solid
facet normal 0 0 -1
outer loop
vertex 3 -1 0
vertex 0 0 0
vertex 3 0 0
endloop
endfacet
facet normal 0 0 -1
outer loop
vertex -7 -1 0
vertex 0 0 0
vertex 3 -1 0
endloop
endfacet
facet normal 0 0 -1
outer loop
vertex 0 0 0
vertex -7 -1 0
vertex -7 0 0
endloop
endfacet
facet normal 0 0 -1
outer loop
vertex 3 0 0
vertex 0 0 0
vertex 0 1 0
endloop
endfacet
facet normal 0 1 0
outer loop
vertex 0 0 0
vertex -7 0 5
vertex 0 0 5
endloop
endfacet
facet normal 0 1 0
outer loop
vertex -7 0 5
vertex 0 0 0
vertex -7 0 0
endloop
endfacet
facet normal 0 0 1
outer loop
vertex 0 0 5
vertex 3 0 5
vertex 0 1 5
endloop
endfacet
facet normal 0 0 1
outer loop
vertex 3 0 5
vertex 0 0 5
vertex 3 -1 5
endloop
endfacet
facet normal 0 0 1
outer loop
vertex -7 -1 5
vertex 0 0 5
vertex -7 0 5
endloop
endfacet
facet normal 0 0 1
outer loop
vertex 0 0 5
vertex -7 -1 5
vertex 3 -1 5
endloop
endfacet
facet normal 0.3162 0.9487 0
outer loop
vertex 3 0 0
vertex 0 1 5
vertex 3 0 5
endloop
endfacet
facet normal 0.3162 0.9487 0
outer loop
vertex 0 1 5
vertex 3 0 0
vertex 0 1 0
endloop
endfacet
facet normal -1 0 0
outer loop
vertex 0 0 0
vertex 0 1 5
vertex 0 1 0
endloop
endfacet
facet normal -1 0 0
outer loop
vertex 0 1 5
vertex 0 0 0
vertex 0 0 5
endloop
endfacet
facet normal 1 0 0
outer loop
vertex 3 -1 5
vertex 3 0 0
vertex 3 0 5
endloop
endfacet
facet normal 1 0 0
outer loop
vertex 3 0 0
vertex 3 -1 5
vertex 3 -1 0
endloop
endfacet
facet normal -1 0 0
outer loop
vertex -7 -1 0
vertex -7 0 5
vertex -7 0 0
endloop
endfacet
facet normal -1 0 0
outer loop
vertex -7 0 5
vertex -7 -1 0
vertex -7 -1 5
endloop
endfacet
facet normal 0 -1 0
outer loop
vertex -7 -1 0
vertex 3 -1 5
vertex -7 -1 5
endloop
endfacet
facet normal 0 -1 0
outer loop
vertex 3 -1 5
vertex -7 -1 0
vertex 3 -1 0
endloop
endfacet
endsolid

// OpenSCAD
module clip(overhang, clip_width, clip_height, base_height, base_thickness) {
    linear_extrude(clip_width) {
        polygon([[0, 0], [0, overhang], [clip_height, 0]]);
    }
    translate([-(base_height-clip_height), -overhang, 0])
        cube([base_height, base_thickness, clip_width]);
}

clip(
    overhang = 1, 
    clip_width = 5,
    clip_height = 3,
    base_height = 10,
    base_thickness = 1
);
